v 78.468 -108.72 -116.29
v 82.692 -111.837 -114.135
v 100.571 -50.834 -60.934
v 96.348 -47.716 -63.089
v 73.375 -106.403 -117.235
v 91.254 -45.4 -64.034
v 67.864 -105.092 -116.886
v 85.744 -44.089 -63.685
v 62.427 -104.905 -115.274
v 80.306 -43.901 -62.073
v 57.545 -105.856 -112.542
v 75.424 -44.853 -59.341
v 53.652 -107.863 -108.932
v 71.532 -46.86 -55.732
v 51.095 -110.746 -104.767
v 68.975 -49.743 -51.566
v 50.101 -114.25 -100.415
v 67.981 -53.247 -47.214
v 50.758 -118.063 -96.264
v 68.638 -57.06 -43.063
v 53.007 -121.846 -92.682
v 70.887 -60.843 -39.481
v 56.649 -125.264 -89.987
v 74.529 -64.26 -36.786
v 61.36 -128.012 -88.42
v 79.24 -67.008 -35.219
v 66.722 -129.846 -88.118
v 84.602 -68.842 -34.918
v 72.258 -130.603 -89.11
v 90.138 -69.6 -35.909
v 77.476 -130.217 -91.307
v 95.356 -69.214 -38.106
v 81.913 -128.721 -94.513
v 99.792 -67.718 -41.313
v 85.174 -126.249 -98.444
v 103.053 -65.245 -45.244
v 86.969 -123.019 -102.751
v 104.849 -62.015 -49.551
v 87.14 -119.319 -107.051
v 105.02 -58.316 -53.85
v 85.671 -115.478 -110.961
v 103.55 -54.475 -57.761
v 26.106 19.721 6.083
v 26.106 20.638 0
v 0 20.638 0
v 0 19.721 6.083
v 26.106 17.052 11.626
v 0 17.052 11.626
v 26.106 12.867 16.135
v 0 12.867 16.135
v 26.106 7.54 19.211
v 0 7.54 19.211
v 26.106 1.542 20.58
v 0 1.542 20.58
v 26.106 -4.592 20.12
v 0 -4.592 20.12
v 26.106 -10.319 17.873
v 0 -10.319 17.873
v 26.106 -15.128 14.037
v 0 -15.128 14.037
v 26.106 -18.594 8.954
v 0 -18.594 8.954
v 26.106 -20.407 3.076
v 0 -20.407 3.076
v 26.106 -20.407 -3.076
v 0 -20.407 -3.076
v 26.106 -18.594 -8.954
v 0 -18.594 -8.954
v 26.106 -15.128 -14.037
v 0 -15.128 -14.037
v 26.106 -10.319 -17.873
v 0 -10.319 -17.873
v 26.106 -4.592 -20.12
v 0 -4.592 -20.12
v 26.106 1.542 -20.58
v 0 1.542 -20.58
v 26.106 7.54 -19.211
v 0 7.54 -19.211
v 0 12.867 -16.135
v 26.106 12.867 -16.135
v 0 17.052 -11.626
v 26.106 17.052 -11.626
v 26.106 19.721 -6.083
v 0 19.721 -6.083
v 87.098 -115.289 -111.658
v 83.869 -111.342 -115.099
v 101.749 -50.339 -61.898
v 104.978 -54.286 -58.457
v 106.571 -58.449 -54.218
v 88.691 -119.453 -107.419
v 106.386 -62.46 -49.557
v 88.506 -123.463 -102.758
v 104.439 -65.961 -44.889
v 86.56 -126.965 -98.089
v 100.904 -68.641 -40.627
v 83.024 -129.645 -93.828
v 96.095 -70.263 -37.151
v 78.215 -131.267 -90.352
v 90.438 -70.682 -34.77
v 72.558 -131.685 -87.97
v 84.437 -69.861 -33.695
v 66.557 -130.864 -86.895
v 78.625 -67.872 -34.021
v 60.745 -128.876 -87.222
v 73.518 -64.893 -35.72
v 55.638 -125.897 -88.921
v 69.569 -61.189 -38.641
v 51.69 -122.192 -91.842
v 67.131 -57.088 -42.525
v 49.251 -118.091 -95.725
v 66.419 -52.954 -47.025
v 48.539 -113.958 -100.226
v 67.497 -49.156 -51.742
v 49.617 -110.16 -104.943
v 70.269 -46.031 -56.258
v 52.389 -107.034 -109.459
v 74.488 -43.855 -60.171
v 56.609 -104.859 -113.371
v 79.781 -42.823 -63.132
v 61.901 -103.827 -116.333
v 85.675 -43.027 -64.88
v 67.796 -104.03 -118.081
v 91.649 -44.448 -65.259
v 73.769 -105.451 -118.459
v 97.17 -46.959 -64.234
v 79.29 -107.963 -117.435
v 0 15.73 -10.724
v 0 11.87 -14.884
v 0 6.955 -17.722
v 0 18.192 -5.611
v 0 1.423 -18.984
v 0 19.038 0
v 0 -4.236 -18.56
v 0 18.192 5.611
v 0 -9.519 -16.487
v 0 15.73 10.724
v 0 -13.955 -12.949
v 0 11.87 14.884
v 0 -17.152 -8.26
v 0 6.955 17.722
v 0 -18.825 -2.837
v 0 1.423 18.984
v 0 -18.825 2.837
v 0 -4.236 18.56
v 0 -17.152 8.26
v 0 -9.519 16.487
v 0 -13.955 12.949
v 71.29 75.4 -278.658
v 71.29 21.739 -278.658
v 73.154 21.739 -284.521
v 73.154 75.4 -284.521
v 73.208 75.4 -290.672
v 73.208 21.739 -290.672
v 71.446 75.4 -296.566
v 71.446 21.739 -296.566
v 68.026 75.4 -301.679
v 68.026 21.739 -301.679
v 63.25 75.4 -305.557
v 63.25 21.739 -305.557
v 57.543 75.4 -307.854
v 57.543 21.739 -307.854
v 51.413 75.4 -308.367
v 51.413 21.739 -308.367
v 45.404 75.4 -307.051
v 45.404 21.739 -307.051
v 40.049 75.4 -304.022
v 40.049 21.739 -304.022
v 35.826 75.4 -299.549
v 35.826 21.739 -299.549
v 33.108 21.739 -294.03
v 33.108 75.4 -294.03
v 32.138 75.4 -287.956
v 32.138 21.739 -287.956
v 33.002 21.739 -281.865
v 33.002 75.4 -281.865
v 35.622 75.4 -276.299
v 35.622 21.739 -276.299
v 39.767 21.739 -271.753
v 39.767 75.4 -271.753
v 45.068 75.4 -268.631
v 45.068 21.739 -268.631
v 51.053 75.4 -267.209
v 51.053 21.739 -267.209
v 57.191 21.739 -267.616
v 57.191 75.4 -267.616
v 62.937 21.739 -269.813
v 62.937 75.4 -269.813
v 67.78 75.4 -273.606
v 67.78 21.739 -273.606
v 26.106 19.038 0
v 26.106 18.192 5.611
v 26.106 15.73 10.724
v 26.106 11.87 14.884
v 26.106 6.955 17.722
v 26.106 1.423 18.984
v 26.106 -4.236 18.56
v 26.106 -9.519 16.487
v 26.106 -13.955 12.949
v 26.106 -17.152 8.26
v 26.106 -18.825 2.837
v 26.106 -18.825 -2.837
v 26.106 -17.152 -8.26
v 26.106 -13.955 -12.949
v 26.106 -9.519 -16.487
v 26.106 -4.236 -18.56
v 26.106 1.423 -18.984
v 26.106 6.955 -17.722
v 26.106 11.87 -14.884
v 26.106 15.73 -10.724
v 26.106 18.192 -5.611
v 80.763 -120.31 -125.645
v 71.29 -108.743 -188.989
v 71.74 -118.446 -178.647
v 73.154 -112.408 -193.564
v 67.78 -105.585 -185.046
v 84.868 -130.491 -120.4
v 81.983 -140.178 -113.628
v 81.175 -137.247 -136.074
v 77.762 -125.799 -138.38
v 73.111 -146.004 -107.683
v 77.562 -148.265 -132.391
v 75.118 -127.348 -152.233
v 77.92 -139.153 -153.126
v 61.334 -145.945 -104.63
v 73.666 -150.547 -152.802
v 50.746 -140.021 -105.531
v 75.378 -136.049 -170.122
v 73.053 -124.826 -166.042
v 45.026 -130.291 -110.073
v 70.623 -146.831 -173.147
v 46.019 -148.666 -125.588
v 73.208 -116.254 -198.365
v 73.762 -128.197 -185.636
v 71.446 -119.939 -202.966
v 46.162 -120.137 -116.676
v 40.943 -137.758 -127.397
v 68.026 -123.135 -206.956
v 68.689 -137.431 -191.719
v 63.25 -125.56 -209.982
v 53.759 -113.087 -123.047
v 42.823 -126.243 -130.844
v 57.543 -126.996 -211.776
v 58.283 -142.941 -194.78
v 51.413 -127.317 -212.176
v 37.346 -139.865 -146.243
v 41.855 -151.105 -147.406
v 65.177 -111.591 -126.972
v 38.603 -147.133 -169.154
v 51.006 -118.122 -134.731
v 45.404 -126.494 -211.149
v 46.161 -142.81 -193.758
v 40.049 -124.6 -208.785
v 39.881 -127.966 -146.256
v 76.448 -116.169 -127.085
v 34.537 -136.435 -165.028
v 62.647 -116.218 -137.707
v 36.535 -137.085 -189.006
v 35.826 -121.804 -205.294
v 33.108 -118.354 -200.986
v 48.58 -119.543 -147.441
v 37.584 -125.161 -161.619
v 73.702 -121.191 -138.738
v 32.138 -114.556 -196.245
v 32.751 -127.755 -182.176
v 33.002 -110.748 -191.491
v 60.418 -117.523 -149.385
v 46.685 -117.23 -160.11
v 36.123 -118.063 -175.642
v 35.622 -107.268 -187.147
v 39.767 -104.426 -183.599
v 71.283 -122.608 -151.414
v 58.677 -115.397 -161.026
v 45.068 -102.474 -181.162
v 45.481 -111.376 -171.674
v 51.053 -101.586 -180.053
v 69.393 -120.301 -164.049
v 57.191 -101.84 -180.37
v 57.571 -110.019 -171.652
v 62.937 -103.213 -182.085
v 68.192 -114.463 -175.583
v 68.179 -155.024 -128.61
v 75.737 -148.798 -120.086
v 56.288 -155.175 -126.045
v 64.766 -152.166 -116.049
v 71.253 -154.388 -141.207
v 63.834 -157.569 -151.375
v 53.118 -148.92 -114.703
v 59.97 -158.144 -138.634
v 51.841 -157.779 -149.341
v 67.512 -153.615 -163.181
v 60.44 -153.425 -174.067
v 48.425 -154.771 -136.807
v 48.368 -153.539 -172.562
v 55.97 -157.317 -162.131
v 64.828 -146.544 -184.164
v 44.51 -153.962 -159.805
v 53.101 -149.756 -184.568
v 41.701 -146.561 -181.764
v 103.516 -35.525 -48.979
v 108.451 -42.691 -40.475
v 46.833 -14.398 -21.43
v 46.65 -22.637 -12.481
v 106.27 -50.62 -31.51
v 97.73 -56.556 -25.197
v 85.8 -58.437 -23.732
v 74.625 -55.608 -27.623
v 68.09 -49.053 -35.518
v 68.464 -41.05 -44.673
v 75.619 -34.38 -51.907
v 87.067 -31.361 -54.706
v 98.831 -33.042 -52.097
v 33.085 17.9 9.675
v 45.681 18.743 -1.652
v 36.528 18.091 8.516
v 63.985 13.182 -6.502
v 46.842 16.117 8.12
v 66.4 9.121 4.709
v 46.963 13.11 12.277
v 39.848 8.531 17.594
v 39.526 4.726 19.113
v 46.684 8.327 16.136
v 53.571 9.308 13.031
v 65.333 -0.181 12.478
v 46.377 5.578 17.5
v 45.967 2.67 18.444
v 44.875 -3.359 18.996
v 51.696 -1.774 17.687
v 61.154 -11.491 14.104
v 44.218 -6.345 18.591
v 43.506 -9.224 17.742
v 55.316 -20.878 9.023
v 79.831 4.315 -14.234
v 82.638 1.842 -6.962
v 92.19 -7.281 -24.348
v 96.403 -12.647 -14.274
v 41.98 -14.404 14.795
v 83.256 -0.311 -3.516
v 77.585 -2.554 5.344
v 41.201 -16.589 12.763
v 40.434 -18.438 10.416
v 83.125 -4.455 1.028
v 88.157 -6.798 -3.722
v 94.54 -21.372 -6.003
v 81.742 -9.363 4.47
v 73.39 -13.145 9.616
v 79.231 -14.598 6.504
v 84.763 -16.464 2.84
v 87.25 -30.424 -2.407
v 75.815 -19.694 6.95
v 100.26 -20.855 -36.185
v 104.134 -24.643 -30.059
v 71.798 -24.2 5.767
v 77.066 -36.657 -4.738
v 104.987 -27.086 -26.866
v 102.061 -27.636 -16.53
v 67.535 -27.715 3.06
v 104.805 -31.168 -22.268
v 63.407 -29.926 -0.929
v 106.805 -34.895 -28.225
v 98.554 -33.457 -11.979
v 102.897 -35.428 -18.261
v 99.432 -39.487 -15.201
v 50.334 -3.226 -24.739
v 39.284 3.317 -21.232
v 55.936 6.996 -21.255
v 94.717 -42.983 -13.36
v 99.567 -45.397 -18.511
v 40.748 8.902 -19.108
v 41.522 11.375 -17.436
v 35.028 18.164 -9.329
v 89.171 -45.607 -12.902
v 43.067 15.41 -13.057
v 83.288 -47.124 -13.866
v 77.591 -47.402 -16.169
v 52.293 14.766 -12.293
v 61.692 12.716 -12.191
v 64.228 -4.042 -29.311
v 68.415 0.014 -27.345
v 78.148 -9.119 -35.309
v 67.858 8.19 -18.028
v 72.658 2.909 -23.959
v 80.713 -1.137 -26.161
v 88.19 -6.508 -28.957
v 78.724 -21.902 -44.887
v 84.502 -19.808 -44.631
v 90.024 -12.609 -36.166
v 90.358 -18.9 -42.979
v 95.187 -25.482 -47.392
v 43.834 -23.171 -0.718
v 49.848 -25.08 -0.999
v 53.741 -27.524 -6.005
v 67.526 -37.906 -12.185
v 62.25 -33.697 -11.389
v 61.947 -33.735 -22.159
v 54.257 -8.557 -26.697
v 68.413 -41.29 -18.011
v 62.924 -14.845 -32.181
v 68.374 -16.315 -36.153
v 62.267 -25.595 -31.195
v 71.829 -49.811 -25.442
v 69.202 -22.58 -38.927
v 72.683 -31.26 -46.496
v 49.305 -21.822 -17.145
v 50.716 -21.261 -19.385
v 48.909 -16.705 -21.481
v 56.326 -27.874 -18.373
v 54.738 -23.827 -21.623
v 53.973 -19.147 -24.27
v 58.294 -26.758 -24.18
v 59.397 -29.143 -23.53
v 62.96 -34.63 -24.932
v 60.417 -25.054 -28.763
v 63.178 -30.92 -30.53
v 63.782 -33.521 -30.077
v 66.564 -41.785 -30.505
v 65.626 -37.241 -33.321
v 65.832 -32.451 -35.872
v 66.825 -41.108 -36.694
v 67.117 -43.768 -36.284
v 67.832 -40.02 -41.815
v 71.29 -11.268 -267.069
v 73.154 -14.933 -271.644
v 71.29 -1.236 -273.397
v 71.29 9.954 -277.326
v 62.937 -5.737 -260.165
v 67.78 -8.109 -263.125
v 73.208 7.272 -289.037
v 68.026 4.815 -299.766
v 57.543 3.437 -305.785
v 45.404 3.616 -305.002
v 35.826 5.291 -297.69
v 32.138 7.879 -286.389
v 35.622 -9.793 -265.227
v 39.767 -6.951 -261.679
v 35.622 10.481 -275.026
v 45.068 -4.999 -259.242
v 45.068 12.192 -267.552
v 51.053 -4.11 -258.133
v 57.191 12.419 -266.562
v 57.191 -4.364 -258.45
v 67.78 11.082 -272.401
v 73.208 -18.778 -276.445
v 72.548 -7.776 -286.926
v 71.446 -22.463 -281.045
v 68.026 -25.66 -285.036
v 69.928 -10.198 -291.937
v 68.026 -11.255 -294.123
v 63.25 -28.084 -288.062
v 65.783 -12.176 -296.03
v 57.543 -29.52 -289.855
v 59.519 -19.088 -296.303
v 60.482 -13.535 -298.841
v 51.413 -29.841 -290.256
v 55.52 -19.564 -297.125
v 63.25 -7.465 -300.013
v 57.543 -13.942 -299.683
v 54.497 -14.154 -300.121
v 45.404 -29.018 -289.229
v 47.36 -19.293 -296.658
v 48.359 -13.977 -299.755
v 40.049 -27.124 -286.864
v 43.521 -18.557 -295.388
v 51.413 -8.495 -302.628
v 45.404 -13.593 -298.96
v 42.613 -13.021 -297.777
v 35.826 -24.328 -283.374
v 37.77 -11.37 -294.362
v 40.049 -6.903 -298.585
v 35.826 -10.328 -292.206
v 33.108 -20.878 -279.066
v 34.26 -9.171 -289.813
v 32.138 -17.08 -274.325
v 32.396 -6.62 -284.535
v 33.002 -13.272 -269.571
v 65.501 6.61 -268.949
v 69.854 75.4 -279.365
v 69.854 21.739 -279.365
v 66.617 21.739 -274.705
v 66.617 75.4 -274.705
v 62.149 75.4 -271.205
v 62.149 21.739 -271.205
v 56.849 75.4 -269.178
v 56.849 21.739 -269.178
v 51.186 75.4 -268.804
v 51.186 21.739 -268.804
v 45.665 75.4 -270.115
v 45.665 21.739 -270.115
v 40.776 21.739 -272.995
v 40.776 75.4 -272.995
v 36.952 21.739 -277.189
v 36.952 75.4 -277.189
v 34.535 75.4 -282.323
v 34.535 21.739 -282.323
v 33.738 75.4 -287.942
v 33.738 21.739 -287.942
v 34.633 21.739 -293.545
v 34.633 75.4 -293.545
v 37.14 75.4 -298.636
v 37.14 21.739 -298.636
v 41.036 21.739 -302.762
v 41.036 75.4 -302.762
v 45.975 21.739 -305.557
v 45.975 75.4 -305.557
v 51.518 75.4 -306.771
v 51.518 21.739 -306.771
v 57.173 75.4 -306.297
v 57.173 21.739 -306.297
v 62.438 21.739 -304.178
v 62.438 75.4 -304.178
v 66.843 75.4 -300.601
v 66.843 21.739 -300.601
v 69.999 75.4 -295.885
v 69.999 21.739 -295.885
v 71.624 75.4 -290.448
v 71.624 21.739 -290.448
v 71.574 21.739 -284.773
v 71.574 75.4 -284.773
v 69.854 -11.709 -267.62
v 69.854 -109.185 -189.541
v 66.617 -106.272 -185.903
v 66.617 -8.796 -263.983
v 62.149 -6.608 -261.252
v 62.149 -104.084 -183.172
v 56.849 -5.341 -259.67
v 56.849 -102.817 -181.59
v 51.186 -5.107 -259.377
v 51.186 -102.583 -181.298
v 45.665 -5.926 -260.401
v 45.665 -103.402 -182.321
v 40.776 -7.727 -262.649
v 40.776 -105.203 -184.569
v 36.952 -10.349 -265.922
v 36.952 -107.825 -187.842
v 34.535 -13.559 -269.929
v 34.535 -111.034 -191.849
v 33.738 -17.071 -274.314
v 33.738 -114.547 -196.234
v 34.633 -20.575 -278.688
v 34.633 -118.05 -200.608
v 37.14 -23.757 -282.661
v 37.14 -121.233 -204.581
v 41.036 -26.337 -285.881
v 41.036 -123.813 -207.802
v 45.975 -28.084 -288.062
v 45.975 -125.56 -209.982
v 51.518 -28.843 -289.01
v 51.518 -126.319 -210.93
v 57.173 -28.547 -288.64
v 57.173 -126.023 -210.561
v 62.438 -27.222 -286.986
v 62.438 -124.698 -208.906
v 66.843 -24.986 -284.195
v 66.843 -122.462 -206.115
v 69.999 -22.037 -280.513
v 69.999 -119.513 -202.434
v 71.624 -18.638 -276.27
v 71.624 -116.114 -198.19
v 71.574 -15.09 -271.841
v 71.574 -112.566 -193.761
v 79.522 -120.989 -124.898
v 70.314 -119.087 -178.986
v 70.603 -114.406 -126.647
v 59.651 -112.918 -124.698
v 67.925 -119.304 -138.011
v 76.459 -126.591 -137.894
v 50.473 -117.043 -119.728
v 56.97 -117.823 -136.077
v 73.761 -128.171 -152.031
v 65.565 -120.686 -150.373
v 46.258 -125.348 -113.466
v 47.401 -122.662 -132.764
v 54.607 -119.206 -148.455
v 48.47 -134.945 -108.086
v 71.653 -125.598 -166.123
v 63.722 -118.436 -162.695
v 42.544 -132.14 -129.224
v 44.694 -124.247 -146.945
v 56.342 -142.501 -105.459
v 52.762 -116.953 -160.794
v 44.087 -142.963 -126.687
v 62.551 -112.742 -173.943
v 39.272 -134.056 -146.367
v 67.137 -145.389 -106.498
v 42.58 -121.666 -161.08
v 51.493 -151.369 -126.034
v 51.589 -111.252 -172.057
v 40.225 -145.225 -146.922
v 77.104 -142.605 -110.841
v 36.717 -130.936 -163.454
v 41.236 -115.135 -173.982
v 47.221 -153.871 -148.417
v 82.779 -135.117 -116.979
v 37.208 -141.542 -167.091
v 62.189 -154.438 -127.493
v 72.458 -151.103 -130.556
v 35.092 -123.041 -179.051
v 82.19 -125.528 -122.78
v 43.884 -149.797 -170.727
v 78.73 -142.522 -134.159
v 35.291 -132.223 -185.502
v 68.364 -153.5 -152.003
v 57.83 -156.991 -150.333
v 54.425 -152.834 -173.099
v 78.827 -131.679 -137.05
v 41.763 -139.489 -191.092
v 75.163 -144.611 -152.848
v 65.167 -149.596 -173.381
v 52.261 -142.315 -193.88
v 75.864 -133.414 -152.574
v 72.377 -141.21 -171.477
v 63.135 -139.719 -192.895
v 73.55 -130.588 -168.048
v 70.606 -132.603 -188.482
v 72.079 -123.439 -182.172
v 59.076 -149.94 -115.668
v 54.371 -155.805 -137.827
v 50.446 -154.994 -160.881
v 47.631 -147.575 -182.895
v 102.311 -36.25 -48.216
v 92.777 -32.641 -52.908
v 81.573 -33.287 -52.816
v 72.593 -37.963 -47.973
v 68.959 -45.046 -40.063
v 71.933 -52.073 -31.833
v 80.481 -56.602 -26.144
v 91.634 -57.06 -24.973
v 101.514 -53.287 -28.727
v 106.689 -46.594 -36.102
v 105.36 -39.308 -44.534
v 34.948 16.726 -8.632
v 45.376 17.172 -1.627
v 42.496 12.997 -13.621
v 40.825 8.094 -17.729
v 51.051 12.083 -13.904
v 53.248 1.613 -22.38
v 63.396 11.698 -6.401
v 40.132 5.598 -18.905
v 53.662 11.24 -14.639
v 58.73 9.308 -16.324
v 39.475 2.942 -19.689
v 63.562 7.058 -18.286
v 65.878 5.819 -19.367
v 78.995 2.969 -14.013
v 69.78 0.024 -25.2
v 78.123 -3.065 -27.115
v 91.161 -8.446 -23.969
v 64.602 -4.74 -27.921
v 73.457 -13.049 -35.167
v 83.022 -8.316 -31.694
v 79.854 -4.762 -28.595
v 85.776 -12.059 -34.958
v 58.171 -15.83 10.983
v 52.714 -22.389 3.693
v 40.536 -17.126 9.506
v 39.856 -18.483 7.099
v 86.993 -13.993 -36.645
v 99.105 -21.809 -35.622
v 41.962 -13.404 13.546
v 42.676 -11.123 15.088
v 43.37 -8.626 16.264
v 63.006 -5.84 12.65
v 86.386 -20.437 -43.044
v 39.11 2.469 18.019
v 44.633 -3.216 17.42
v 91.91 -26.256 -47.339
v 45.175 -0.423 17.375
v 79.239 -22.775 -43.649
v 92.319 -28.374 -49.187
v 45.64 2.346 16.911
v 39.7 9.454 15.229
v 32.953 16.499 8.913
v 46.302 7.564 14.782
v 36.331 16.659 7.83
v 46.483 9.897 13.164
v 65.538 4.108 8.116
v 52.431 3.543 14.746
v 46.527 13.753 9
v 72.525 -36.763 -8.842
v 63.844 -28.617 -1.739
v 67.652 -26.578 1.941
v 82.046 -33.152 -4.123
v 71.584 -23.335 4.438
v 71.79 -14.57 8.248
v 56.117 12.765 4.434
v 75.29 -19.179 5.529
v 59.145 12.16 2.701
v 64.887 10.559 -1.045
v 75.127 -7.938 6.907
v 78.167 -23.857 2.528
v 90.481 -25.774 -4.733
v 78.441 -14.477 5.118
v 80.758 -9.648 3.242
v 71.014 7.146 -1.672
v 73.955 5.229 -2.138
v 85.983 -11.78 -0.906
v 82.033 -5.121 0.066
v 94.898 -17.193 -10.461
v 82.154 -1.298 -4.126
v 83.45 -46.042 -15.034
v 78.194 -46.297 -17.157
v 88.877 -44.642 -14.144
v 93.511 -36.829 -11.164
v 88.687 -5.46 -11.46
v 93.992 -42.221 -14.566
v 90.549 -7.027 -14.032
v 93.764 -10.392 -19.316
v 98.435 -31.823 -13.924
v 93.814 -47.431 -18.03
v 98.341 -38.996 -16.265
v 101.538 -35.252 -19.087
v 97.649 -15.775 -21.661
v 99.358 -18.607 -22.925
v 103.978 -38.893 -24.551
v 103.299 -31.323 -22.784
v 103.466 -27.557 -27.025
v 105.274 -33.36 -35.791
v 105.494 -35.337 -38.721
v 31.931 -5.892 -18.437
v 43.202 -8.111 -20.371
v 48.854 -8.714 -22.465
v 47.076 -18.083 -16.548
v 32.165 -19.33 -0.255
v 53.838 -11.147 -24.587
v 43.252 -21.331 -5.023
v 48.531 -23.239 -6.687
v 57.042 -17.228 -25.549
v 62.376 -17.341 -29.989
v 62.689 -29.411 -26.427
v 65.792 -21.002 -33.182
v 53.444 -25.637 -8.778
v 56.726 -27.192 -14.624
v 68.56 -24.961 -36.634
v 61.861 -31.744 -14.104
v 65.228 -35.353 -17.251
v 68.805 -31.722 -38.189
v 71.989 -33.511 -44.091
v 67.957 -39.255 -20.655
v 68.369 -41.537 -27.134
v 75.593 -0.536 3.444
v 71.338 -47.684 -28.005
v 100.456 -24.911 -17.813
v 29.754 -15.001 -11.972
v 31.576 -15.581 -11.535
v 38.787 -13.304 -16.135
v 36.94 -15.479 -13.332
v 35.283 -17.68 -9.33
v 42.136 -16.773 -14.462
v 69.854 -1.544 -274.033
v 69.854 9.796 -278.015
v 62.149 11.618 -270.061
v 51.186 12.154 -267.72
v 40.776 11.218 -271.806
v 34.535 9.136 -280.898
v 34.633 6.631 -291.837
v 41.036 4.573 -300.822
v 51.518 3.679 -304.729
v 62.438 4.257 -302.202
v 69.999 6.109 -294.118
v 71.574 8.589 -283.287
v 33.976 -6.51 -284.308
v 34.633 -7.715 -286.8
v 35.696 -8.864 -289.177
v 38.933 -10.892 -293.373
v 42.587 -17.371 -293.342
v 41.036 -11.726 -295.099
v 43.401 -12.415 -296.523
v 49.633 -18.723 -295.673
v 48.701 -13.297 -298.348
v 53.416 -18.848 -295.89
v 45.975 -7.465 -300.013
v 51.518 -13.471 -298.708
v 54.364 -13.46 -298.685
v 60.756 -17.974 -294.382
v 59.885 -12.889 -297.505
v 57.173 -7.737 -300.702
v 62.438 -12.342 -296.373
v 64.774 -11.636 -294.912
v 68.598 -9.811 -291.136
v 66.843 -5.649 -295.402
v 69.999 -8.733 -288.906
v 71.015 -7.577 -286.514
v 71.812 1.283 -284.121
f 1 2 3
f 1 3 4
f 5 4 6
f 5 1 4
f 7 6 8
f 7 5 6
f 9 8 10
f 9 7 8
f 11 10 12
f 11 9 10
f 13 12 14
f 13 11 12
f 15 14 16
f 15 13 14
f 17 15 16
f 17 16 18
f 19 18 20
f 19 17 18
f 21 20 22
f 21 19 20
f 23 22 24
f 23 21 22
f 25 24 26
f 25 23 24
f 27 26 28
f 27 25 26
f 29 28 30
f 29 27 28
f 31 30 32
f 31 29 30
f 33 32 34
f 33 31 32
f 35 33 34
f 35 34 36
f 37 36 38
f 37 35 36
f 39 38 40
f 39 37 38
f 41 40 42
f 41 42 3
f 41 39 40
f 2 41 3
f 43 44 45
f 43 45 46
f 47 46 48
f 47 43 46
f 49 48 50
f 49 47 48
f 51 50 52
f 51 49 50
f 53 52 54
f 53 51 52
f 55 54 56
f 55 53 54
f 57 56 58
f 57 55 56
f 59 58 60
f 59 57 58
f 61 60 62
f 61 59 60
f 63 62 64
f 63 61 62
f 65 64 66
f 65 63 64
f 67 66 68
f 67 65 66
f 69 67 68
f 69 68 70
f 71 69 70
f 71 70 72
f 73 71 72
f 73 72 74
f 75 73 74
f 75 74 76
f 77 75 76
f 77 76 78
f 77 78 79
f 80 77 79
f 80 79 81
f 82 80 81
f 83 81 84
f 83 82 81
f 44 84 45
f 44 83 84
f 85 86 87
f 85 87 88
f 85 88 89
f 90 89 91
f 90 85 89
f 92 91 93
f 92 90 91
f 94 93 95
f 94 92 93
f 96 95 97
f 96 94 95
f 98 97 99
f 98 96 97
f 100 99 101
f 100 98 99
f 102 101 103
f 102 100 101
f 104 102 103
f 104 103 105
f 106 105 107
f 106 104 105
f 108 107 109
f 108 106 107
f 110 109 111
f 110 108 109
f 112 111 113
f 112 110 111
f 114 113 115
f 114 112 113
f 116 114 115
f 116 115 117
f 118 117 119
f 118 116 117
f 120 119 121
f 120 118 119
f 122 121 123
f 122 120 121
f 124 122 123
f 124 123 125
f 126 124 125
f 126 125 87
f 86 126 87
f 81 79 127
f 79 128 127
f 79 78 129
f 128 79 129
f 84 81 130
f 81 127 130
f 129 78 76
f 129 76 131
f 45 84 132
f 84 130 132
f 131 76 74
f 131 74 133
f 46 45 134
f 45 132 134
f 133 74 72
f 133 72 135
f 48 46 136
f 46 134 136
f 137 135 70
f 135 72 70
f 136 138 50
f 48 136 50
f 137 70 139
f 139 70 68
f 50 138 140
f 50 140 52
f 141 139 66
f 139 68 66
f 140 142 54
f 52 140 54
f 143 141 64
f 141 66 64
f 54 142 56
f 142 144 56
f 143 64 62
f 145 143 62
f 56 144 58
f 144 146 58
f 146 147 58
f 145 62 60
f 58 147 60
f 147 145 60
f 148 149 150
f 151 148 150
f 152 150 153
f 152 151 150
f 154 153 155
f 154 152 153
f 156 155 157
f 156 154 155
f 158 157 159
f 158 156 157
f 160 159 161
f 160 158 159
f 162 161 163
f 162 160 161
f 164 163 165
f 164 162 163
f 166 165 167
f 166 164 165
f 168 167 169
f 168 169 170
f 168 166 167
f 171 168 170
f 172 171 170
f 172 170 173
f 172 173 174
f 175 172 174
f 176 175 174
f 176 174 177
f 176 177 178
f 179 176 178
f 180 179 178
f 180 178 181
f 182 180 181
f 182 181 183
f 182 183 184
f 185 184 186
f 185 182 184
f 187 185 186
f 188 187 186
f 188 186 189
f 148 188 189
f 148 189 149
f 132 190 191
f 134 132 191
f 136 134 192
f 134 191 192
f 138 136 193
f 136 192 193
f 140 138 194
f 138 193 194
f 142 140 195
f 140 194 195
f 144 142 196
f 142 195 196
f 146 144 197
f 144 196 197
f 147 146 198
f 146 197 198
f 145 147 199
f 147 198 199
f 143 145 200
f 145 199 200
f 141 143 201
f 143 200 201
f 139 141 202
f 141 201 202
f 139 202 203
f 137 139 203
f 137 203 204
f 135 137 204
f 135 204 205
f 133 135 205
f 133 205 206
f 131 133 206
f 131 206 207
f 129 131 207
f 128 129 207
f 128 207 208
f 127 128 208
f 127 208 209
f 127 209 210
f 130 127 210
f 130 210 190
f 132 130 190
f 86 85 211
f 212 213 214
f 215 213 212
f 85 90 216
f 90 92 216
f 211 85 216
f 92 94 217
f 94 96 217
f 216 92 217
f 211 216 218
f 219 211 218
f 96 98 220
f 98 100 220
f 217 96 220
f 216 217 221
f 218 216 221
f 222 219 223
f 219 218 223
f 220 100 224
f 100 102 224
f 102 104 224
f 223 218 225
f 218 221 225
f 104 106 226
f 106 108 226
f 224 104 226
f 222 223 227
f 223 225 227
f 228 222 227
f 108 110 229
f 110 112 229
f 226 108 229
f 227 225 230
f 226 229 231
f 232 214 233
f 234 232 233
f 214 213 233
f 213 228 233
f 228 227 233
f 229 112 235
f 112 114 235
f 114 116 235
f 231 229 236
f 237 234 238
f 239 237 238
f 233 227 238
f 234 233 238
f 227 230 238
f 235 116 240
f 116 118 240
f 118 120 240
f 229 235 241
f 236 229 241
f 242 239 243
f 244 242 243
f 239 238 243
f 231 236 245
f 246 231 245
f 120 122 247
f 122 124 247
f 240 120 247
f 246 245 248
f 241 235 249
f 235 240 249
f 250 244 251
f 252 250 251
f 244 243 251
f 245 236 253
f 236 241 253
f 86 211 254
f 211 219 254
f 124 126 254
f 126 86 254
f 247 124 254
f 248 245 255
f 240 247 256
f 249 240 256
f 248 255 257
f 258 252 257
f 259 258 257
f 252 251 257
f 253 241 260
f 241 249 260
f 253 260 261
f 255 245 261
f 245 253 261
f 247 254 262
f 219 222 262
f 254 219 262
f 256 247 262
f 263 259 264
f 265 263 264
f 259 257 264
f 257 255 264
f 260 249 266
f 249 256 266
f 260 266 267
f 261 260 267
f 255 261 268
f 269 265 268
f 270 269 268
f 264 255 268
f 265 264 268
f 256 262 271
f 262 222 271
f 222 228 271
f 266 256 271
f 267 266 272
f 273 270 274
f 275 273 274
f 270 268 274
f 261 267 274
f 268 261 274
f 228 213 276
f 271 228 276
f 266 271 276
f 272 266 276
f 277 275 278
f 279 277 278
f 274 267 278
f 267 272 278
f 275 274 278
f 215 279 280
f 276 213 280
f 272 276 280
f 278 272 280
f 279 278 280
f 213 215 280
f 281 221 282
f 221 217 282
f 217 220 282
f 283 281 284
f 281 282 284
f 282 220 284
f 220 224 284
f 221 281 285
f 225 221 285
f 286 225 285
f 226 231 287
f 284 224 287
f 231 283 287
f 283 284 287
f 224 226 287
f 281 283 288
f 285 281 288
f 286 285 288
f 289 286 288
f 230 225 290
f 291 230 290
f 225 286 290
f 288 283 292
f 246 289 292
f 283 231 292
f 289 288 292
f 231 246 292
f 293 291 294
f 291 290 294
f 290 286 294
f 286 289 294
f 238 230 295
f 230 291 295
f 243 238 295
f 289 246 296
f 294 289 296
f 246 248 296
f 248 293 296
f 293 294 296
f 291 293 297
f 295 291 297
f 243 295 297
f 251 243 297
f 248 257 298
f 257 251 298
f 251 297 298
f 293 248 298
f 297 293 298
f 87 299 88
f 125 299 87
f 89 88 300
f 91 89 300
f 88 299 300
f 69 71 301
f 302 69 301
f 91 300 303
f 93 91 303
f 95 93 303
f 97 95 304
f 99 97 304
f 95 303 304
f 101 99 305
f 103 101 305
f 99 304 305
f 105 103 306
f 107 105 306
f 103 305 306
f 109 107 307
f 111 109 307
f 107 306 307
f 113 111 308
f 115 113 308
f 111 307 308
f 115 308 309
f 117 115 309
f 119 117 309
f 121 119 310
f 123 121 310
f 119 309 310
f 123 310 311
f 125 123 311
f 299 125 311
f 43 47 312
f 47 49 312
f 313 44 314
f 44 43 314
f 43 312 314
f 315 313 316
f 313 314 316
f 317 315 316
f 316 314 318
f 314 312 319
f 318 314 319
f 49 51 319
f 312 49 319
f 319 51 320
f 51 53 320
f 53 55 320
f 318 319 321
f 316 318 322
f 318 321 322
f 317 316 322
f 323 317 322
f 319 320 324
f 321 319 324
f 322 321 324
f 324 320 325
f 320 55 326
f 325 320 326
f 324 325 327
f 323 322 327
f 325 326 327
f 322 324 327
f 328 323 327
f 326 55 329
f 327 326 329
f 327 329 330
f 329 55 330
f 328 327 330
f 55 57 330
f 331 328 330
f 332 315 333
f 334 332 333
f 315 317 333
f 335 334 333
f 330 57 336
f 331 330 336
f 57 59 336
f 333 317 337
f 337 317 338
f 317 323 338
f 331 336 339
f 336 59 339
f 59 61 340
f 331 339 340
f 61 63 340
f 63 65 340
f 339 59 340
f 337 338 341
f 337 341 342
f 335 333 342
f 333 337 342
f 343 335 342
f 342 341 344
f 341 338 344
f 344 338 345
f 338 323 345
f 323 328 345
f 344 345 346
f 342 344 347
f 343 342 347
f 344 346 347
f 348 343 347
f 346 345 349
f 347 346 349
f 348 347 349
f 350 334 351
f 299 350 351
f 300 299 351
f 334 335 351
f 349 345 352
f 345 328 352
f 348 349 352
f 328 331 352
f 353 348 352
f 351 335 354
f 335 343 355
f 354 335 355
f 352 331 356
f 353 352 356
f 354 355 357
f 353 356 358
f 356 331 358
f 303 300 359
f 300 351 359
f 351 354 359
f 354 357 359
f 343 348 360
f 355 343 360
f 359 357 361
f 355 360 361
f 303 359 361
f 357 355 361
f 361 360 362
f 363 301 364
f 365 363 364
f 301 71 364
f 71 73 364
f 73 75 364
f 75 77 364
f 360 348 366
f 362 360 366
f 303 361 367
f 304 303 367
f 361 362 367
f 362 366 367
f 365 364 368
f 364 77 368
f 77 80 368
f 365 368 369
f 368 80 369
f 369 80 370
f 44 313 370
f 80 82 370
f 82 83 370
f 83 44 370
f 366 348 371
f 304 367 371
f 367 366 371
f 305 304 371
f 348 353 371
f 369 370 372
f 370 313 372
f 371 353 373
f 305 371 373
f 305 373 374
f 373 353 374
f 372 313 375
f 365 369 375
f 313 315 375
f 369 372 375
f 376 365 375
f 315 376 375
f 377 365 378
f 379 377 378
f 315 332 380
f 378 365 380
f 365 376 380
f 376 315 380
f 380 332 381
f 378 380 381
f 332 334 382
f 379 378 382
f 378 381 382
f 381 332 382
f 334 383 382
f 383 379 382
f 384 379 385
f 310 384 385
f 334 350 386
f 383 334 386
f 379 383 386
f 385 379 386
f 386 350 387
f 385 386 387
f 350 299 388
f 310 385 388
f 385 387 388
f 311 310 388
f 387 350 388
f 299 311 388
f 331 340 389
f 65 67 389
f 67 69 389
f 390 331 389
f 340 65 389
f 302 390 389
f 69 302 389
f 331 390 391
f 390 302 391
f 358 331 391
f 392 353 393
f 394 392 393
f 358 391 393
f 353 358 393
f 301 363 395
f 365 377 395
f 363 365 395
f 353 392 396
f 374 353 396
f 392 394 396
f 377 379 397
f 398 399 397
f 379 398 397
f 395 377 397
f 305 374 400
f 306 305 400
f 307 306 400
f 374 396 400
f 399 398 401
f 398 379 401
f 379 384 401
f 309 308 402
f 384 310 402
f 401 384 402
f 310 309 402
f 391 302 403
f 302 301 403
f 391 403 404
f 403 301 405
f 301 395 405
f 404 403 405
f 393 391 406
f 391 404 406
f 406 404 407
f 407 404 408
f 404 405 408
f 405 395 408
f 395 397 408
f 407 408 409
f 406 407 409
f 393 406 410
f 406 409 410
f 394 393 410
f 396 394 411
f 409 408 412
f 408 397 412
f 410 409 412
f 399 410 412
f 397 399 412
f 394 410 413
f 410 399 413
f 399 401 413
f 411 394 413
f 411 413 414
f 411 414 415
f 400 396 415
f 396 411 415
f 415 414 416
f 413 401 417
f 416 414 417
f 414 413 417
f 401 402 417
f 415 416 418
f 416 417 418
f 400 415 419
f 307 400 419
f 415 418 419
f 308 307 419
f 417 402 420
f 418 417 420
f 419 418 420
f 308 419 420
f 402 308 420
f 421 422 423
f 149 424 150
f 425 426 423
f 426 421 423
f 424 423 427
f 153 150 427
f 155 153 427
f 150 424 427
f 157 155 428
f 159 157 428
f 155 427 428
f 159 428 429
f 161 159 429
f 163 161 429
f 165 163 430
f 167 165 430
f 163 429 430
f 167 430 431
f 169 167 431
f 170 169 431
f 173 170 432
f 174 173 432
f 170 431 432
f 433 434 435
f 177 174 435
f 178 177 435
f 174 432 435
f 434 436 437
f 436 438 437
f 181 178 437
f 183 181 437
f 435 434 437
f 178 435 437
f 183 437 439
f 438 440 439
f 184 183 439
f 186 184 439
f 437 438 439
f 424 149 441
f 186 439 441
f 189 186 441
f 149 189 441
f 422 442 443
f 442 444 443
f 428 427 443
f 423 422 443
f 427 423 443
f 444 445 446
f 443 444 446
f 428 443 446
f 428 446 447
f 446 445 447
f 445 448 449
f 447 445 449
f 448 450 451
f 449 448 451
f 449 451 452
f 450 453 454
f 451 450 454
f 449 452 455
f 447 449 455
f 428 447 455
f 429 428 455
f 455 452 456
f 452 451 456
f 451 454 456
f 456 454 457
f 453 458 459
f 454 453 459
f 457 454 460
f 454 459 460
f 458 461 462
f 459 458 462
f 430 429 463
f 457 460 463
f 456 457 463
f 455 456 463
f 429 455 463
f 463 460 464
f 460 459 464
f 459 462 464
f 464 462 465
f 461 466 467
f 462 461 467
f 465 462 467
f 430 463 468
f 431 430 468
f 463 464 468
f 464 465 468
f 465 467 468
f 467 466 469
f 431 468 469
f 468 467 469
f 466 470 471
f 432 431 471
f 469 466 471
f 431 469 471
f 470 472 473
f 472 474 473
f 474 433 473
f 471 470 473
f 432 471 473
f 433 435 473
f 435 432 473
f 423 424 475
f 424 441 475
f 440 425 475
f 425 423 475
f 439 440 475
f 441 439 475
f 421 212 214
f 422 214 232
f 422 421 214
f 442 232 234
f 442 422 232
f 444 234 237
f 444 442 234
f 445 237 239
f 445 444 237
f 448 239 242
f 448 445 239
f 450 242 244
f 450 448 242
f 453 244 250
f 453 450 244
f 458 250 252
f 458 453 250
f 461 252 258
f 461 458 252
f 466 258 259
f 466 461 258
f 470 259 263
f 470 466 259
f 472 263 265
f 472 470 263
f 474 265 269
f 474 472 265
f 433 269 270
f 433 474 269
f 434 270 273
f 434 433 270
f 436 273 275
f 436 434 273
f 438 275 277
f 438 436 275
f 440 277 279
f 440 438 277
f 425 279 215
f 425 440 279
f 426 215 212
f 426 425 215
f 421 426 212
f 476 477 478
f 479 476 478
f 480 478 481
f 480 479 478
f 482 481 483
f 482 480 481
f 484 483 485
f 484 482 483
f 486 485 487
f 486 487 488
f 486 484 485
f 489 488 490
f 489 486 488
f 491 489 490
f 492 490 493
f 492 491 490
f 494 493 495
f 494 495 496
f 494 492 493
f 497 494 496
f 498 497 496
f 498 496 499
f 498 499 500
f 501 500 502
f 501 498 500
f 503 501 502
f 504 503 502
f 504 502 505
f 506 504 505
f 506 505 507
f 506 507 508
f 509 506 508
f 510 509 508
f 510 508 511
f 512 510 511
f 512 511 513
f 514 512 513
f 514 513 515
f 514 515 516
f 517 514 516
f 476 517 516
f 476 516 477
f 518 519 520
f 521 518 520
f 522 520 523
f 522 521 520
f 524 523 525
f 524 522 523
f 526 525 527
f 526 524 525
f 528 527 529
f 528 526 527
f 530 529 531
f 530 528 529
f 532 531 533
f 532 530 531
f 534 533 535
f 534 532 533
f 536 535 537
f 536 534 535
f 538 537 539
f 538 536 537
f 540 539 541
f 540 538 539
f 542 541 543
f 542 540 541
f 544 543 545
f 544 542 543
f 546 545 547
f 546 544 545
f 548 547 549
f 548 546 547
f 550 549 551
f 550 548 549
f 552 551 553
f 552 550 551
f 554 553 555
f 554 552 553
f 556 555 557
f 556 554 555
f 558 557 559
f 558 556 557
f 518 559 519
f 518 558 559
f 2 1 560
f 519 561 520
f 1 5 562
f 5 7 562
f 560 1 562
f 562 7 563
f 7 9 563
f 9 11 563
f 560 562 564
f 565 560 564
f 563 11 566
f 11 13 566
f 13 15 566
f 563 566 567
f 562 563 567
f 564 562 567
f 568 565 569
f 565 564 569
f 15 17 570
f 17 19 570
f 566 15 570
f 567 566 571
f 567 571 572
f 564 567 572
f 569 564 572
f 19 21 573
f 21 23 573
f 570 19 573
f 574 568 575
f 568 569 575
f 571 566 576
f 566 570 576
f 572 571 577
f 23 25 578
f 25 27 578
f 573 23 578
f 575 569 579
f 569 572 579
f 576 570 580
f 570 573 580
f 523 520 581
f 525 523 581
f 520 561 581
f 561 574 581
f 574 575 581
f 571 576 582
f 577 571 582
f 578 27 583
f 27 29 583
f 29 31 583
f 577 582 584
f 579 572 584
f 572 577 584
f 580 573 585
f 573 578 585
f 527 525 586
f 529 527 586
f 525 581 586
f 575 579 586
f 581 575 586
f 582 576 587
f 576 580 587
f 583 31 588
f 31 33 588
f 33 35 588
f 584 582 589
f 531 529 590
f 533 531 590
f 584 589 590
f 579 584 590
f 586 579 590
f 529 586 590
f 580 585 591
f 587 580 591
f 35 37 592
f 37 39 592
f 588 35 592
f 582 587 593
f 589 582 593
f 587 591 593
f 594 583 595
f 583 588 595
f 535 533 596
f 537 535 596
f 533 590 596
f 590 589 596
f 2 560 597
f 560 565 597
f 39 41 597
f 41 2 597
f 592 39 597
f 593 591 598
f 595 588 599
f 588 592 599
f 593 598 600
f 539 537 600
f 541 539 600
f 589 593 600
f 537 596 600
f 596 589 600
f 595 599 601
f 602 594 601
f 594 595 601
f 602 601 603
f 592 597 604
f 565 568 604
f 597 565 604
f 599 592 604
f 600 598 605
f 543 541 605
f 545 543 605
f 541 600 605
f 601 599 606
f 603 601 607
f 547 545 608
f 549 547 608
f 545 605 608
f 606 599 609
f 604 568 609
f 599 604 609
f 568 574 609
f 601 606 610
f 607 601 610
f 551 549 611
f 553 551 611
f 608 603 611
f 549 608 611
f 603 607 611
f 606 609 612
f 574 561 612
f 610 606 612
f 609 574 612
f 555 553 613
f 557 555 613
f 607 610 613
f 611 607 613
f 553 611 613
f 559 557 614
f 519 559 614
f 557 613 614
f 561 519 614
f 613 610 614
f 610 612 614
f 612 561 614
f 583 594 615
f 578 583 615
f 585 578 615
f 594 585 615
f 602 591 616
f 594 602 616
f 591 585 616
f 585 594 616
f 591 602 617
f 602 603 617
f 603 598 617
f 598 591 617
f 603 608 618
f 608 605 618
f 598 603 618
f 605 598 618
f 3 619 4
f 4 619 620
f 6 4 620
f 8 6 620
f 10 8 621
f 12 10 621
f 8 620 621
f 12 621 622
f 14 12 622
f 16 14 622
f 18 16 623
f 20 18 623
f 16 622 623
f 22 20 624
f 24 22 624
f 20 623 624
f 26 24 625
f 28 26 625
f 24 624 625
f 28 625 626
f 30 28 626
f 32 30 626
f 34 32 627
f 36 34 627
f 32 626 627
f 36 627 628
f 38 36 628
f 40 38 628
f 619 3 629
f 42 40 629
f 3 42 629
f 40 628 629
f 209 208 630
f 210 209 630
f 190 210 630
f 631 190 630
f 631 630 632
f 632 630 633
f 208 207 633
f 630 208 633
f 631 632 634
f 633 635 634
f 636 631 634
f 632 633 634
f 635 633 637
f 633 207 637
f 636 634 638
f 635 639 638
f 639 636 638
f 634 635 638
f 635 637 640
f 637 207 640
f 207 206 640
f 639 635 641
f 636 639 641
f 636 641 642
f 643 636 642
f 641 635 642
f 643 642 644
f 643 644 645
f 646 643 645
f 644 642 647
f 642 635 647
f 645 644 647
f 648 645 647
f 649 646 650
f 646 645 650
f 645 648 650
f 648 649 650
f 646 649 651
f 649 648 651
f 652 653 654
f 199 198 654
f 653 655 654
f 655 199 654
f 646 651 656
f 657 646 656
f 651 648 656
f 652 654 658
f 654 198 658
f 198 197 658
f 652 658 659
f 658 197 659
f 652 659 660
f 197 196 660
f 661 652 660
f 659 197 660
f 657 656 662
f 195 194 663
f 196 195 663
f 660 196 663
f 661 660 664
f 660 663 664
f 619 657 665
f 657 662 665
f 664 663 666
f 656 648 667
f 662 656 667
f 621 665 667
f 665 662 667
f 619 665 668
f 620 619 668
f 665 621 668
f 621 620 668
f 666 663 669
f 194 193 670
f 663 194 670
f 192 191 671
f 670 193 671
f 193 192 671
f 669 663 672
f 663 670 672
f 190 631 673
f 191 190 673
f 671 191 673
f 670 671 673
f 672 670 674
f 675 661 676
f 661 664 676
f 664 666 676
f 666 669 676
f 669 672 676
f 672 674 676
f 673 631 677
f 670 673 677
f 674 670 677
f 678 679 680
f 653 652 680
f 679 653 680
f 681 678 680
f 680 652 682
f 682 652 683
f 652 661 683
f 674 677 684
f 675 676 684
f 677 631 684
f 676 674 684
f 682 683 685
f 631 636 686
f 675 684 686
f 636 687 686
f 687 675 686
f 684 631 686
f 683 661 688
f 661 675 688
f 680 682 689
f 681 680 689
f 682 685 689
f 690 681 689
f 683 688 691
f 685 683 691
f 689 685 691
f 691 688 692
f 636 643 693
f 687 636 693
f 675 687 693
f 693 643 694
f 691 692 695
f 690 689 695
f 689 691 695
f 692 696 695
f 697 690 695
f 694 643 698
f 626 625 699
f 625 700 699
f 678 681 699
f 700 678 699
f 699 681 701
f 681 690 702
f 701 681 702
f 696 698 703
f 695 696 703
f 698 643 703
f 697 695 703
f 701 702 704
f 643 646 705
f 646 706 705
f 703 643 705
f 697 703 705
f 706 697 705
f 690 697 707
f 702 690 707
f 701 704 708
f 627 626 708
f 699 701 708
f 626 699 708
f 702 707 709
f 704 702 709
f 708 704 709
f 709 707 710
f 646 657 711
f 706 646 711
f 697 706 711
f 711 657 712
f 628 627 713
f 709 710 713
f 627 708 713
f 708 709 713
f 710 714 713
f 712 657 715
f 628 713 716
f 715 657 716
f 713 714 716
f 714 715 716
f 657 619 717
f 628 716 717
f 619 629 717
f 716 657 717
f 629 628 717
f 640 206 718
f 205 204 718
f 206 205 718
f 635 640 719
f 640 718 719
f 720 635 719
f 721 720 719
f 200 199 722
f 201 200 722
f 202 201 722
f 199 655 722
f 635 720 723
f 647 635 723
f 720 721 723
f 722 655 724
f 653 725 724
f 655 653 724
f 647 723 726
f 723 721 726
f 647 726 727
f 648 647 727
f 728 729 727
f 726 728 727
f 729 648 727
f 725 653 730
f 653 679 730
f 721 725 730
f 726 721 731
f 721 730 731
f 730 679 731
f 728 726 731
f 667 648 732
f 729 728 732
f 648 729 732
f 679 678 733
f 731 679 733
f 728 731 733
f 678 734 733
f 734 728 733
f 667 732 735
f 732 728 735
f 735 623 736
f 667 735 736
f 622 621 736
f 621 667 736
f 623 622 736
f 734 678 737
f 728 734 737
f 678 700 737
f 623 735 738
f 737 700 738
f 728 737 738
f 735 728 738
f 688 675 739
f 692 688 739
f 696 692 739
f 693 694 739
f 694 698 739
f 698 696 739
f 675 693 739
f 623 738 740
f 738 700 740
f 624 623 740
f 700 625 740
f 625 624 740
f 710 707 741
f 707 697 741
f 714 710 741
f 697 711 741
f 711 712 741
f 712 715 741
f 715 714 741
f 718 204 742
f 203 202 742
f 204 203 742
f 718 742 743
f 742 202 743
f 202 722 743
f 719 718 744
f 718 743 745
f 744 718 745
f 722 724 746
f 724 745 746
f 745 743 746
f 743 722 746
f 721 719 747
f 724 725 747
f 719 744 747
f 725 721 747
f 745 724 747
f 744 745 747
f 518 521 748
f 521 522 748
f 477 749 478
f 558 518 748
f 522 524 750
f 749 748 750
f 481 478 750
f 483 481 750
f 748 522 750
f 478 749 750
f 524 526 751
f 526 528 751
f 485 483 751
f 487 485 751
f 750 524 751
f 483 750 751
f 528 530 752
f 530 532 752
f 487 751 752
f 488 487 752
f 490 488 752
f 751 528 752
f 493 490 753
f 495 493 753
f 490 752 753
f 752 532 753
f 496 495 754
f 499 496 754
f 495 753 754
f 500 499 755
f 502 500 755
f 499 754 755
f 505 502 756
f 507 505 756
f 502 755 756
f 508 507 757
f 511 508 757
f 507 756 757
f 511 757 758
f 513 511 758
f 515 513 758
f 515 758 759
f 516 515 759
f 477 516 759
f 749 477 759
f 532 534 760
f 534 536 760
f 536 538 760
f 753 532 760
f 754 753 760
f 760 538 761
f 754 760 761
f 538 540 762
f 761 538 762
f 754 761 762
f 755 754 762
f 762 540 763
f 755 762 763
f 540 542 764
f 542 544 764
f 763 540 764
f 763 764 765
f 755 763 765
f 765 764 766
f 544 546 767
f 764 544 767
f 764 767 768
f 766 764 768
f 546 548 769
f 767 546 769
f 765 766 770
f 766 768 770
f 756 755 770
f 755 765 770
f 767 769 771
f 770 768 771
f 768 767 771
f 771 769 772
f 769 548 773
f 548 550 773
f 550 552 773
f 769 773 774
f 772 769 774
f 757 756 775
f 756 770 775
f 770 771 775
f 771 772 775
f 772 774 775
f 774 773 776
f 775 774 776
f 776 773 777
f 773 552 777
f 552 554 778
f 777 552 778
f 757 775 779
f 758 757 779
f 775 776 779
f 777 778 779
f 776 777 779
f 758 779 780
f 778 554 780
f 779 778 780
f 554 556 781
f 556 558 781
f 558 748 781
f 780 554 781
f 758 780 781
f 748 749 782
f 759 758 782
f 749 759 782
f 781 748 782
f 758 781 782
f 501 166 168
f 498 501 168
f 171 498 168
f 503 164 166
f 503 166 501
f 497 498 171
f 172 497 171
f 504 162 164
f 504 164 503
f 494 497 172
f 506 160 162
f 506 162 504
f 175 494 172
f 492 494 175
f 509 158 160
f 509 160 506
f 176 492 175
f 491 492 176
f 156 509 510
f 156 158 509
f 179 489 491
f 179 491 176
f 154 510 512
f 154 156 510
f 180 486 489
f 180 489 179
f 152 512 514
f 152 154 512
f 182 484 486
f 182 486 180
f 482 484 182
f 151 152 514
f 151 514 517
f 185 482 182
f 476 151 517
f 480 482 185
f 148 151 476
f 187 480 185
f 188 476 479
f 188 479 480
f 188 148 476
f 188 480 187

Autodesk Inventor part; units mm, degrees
sketch "Sketch1" plane through (0, 0, 0) normal (1, 0, 0) x (0, 1, 0)
  line L0 (0, 0) -> (-172, -150)
  line L1 (-172, -150) -> (0, -287.775)
  line L2 (0, -287.775) -> (75.4, -287.775)
  line L3 (0, 0) -> (0, -103.1875) construction
  line L4 (0, -103.1875) -> (-172, -52.775) construction
  line L5 (-172, -52.775) -> (0, -52.775) construction
  line L6 (0, -52.775) -> (75.4, -52.775) construction
  dimension "d0" = 287.775
  dimension "d4" = 150
  dimension "d5" = 75.4
  dimension "d6" = 103.1875
  dimension "d7" = 52.775
  dimension "d8" = 52.775
  dimension "d19" = 172
  dimension "d20" = 0
ref_plane "Work Plane1" through (103.1875, 0, 0) normal (1, 0, 0) x (0, 1, 0)
ref_plane "Work Plane2" through (52.775, 0, 0) normal (1, 0, 0) x (0, 1, 0)
ref_plane "Work Plane3" through (52.775, 0, 0) normal (1, 0, 0) x (0, 1, 0)
sketch "Sketch2" plane through (103.1875, 0, 0) normal (1, 0, 0) x (0, 1, 0)
  point P0 (0, 0)
  point P1 (0, 0)
sketch "Sketch3" plane through (52.775, 0, 0) normal (1, 0, 0) x (0, 1, 0)
  point P0 (0, 0)
  point P1 (-172, -150)
  point P2 (0, -287.775)
sketch "Sketch4" plane through (52.775, 0, 0) normal (1, 0, 0) x (0, 1, 0)
  point P0 (0, 0)
  point P1 (75.4, -287.775)
  point P2 (0, -287.775)
sketch "Sketch5" plane through (0, 0, 0) normal (1, 0, 0) x (0, 1, 0)
  circle A0 centre (0, 0) radius 20.6375
  circle A1 centre (0, 0) radius 19.0375
  dimension "d15" = 1.6
  dimension "d17" = 41.275
sketch3d "3D Sketch1"
  line L0 (0, 0, 0) -> (26.1063, 0, 0)
  arc A0 (26.1063, 0, 0) -> (86.5614, -56.7256, -49.47) centre (26.1063, -46.6611, -40.6928) ccw
  line L1 (86.5614, -56.7256, -49.47) -> (68.6816, -117.7291, -102.6707)
  arc A1 (68.6816, -117.7291, -102.6707) -> (52.775, -114.4429, -196.1042) centre (66.334, -76.6761, -148.9557) ccw
  line L2 (52.775, -114.4429, -196.1042) -> (52.775, -16.9671, -274.184)
  arc A2 (52.775, -16.9671, -274.184) -> (52.775, 21.7393, -287.775) centre (52.775, 21.7393, -225.8625) ccw
  line L3 (52.775, 21.7393, -287.775) -> (52.775, 75.4, -287.775)
  dimension "d12" = 61.9125
  dimension "d13" = 61.9125
  dimension "d14" = 61.9125
sweep "Sweep1" add profiles "Sketch5" path "3D Sketch1"
equation "\"d8\" = d7"
equation "\"d13\" = d12"
equation "\"d14\" = d12"
equation "\"d9\" = d6"
equation "\"d10\" = d8"
equation "\"d11\" = d7"
properties part number "exhaust header right pipe 7" material "Steel"
